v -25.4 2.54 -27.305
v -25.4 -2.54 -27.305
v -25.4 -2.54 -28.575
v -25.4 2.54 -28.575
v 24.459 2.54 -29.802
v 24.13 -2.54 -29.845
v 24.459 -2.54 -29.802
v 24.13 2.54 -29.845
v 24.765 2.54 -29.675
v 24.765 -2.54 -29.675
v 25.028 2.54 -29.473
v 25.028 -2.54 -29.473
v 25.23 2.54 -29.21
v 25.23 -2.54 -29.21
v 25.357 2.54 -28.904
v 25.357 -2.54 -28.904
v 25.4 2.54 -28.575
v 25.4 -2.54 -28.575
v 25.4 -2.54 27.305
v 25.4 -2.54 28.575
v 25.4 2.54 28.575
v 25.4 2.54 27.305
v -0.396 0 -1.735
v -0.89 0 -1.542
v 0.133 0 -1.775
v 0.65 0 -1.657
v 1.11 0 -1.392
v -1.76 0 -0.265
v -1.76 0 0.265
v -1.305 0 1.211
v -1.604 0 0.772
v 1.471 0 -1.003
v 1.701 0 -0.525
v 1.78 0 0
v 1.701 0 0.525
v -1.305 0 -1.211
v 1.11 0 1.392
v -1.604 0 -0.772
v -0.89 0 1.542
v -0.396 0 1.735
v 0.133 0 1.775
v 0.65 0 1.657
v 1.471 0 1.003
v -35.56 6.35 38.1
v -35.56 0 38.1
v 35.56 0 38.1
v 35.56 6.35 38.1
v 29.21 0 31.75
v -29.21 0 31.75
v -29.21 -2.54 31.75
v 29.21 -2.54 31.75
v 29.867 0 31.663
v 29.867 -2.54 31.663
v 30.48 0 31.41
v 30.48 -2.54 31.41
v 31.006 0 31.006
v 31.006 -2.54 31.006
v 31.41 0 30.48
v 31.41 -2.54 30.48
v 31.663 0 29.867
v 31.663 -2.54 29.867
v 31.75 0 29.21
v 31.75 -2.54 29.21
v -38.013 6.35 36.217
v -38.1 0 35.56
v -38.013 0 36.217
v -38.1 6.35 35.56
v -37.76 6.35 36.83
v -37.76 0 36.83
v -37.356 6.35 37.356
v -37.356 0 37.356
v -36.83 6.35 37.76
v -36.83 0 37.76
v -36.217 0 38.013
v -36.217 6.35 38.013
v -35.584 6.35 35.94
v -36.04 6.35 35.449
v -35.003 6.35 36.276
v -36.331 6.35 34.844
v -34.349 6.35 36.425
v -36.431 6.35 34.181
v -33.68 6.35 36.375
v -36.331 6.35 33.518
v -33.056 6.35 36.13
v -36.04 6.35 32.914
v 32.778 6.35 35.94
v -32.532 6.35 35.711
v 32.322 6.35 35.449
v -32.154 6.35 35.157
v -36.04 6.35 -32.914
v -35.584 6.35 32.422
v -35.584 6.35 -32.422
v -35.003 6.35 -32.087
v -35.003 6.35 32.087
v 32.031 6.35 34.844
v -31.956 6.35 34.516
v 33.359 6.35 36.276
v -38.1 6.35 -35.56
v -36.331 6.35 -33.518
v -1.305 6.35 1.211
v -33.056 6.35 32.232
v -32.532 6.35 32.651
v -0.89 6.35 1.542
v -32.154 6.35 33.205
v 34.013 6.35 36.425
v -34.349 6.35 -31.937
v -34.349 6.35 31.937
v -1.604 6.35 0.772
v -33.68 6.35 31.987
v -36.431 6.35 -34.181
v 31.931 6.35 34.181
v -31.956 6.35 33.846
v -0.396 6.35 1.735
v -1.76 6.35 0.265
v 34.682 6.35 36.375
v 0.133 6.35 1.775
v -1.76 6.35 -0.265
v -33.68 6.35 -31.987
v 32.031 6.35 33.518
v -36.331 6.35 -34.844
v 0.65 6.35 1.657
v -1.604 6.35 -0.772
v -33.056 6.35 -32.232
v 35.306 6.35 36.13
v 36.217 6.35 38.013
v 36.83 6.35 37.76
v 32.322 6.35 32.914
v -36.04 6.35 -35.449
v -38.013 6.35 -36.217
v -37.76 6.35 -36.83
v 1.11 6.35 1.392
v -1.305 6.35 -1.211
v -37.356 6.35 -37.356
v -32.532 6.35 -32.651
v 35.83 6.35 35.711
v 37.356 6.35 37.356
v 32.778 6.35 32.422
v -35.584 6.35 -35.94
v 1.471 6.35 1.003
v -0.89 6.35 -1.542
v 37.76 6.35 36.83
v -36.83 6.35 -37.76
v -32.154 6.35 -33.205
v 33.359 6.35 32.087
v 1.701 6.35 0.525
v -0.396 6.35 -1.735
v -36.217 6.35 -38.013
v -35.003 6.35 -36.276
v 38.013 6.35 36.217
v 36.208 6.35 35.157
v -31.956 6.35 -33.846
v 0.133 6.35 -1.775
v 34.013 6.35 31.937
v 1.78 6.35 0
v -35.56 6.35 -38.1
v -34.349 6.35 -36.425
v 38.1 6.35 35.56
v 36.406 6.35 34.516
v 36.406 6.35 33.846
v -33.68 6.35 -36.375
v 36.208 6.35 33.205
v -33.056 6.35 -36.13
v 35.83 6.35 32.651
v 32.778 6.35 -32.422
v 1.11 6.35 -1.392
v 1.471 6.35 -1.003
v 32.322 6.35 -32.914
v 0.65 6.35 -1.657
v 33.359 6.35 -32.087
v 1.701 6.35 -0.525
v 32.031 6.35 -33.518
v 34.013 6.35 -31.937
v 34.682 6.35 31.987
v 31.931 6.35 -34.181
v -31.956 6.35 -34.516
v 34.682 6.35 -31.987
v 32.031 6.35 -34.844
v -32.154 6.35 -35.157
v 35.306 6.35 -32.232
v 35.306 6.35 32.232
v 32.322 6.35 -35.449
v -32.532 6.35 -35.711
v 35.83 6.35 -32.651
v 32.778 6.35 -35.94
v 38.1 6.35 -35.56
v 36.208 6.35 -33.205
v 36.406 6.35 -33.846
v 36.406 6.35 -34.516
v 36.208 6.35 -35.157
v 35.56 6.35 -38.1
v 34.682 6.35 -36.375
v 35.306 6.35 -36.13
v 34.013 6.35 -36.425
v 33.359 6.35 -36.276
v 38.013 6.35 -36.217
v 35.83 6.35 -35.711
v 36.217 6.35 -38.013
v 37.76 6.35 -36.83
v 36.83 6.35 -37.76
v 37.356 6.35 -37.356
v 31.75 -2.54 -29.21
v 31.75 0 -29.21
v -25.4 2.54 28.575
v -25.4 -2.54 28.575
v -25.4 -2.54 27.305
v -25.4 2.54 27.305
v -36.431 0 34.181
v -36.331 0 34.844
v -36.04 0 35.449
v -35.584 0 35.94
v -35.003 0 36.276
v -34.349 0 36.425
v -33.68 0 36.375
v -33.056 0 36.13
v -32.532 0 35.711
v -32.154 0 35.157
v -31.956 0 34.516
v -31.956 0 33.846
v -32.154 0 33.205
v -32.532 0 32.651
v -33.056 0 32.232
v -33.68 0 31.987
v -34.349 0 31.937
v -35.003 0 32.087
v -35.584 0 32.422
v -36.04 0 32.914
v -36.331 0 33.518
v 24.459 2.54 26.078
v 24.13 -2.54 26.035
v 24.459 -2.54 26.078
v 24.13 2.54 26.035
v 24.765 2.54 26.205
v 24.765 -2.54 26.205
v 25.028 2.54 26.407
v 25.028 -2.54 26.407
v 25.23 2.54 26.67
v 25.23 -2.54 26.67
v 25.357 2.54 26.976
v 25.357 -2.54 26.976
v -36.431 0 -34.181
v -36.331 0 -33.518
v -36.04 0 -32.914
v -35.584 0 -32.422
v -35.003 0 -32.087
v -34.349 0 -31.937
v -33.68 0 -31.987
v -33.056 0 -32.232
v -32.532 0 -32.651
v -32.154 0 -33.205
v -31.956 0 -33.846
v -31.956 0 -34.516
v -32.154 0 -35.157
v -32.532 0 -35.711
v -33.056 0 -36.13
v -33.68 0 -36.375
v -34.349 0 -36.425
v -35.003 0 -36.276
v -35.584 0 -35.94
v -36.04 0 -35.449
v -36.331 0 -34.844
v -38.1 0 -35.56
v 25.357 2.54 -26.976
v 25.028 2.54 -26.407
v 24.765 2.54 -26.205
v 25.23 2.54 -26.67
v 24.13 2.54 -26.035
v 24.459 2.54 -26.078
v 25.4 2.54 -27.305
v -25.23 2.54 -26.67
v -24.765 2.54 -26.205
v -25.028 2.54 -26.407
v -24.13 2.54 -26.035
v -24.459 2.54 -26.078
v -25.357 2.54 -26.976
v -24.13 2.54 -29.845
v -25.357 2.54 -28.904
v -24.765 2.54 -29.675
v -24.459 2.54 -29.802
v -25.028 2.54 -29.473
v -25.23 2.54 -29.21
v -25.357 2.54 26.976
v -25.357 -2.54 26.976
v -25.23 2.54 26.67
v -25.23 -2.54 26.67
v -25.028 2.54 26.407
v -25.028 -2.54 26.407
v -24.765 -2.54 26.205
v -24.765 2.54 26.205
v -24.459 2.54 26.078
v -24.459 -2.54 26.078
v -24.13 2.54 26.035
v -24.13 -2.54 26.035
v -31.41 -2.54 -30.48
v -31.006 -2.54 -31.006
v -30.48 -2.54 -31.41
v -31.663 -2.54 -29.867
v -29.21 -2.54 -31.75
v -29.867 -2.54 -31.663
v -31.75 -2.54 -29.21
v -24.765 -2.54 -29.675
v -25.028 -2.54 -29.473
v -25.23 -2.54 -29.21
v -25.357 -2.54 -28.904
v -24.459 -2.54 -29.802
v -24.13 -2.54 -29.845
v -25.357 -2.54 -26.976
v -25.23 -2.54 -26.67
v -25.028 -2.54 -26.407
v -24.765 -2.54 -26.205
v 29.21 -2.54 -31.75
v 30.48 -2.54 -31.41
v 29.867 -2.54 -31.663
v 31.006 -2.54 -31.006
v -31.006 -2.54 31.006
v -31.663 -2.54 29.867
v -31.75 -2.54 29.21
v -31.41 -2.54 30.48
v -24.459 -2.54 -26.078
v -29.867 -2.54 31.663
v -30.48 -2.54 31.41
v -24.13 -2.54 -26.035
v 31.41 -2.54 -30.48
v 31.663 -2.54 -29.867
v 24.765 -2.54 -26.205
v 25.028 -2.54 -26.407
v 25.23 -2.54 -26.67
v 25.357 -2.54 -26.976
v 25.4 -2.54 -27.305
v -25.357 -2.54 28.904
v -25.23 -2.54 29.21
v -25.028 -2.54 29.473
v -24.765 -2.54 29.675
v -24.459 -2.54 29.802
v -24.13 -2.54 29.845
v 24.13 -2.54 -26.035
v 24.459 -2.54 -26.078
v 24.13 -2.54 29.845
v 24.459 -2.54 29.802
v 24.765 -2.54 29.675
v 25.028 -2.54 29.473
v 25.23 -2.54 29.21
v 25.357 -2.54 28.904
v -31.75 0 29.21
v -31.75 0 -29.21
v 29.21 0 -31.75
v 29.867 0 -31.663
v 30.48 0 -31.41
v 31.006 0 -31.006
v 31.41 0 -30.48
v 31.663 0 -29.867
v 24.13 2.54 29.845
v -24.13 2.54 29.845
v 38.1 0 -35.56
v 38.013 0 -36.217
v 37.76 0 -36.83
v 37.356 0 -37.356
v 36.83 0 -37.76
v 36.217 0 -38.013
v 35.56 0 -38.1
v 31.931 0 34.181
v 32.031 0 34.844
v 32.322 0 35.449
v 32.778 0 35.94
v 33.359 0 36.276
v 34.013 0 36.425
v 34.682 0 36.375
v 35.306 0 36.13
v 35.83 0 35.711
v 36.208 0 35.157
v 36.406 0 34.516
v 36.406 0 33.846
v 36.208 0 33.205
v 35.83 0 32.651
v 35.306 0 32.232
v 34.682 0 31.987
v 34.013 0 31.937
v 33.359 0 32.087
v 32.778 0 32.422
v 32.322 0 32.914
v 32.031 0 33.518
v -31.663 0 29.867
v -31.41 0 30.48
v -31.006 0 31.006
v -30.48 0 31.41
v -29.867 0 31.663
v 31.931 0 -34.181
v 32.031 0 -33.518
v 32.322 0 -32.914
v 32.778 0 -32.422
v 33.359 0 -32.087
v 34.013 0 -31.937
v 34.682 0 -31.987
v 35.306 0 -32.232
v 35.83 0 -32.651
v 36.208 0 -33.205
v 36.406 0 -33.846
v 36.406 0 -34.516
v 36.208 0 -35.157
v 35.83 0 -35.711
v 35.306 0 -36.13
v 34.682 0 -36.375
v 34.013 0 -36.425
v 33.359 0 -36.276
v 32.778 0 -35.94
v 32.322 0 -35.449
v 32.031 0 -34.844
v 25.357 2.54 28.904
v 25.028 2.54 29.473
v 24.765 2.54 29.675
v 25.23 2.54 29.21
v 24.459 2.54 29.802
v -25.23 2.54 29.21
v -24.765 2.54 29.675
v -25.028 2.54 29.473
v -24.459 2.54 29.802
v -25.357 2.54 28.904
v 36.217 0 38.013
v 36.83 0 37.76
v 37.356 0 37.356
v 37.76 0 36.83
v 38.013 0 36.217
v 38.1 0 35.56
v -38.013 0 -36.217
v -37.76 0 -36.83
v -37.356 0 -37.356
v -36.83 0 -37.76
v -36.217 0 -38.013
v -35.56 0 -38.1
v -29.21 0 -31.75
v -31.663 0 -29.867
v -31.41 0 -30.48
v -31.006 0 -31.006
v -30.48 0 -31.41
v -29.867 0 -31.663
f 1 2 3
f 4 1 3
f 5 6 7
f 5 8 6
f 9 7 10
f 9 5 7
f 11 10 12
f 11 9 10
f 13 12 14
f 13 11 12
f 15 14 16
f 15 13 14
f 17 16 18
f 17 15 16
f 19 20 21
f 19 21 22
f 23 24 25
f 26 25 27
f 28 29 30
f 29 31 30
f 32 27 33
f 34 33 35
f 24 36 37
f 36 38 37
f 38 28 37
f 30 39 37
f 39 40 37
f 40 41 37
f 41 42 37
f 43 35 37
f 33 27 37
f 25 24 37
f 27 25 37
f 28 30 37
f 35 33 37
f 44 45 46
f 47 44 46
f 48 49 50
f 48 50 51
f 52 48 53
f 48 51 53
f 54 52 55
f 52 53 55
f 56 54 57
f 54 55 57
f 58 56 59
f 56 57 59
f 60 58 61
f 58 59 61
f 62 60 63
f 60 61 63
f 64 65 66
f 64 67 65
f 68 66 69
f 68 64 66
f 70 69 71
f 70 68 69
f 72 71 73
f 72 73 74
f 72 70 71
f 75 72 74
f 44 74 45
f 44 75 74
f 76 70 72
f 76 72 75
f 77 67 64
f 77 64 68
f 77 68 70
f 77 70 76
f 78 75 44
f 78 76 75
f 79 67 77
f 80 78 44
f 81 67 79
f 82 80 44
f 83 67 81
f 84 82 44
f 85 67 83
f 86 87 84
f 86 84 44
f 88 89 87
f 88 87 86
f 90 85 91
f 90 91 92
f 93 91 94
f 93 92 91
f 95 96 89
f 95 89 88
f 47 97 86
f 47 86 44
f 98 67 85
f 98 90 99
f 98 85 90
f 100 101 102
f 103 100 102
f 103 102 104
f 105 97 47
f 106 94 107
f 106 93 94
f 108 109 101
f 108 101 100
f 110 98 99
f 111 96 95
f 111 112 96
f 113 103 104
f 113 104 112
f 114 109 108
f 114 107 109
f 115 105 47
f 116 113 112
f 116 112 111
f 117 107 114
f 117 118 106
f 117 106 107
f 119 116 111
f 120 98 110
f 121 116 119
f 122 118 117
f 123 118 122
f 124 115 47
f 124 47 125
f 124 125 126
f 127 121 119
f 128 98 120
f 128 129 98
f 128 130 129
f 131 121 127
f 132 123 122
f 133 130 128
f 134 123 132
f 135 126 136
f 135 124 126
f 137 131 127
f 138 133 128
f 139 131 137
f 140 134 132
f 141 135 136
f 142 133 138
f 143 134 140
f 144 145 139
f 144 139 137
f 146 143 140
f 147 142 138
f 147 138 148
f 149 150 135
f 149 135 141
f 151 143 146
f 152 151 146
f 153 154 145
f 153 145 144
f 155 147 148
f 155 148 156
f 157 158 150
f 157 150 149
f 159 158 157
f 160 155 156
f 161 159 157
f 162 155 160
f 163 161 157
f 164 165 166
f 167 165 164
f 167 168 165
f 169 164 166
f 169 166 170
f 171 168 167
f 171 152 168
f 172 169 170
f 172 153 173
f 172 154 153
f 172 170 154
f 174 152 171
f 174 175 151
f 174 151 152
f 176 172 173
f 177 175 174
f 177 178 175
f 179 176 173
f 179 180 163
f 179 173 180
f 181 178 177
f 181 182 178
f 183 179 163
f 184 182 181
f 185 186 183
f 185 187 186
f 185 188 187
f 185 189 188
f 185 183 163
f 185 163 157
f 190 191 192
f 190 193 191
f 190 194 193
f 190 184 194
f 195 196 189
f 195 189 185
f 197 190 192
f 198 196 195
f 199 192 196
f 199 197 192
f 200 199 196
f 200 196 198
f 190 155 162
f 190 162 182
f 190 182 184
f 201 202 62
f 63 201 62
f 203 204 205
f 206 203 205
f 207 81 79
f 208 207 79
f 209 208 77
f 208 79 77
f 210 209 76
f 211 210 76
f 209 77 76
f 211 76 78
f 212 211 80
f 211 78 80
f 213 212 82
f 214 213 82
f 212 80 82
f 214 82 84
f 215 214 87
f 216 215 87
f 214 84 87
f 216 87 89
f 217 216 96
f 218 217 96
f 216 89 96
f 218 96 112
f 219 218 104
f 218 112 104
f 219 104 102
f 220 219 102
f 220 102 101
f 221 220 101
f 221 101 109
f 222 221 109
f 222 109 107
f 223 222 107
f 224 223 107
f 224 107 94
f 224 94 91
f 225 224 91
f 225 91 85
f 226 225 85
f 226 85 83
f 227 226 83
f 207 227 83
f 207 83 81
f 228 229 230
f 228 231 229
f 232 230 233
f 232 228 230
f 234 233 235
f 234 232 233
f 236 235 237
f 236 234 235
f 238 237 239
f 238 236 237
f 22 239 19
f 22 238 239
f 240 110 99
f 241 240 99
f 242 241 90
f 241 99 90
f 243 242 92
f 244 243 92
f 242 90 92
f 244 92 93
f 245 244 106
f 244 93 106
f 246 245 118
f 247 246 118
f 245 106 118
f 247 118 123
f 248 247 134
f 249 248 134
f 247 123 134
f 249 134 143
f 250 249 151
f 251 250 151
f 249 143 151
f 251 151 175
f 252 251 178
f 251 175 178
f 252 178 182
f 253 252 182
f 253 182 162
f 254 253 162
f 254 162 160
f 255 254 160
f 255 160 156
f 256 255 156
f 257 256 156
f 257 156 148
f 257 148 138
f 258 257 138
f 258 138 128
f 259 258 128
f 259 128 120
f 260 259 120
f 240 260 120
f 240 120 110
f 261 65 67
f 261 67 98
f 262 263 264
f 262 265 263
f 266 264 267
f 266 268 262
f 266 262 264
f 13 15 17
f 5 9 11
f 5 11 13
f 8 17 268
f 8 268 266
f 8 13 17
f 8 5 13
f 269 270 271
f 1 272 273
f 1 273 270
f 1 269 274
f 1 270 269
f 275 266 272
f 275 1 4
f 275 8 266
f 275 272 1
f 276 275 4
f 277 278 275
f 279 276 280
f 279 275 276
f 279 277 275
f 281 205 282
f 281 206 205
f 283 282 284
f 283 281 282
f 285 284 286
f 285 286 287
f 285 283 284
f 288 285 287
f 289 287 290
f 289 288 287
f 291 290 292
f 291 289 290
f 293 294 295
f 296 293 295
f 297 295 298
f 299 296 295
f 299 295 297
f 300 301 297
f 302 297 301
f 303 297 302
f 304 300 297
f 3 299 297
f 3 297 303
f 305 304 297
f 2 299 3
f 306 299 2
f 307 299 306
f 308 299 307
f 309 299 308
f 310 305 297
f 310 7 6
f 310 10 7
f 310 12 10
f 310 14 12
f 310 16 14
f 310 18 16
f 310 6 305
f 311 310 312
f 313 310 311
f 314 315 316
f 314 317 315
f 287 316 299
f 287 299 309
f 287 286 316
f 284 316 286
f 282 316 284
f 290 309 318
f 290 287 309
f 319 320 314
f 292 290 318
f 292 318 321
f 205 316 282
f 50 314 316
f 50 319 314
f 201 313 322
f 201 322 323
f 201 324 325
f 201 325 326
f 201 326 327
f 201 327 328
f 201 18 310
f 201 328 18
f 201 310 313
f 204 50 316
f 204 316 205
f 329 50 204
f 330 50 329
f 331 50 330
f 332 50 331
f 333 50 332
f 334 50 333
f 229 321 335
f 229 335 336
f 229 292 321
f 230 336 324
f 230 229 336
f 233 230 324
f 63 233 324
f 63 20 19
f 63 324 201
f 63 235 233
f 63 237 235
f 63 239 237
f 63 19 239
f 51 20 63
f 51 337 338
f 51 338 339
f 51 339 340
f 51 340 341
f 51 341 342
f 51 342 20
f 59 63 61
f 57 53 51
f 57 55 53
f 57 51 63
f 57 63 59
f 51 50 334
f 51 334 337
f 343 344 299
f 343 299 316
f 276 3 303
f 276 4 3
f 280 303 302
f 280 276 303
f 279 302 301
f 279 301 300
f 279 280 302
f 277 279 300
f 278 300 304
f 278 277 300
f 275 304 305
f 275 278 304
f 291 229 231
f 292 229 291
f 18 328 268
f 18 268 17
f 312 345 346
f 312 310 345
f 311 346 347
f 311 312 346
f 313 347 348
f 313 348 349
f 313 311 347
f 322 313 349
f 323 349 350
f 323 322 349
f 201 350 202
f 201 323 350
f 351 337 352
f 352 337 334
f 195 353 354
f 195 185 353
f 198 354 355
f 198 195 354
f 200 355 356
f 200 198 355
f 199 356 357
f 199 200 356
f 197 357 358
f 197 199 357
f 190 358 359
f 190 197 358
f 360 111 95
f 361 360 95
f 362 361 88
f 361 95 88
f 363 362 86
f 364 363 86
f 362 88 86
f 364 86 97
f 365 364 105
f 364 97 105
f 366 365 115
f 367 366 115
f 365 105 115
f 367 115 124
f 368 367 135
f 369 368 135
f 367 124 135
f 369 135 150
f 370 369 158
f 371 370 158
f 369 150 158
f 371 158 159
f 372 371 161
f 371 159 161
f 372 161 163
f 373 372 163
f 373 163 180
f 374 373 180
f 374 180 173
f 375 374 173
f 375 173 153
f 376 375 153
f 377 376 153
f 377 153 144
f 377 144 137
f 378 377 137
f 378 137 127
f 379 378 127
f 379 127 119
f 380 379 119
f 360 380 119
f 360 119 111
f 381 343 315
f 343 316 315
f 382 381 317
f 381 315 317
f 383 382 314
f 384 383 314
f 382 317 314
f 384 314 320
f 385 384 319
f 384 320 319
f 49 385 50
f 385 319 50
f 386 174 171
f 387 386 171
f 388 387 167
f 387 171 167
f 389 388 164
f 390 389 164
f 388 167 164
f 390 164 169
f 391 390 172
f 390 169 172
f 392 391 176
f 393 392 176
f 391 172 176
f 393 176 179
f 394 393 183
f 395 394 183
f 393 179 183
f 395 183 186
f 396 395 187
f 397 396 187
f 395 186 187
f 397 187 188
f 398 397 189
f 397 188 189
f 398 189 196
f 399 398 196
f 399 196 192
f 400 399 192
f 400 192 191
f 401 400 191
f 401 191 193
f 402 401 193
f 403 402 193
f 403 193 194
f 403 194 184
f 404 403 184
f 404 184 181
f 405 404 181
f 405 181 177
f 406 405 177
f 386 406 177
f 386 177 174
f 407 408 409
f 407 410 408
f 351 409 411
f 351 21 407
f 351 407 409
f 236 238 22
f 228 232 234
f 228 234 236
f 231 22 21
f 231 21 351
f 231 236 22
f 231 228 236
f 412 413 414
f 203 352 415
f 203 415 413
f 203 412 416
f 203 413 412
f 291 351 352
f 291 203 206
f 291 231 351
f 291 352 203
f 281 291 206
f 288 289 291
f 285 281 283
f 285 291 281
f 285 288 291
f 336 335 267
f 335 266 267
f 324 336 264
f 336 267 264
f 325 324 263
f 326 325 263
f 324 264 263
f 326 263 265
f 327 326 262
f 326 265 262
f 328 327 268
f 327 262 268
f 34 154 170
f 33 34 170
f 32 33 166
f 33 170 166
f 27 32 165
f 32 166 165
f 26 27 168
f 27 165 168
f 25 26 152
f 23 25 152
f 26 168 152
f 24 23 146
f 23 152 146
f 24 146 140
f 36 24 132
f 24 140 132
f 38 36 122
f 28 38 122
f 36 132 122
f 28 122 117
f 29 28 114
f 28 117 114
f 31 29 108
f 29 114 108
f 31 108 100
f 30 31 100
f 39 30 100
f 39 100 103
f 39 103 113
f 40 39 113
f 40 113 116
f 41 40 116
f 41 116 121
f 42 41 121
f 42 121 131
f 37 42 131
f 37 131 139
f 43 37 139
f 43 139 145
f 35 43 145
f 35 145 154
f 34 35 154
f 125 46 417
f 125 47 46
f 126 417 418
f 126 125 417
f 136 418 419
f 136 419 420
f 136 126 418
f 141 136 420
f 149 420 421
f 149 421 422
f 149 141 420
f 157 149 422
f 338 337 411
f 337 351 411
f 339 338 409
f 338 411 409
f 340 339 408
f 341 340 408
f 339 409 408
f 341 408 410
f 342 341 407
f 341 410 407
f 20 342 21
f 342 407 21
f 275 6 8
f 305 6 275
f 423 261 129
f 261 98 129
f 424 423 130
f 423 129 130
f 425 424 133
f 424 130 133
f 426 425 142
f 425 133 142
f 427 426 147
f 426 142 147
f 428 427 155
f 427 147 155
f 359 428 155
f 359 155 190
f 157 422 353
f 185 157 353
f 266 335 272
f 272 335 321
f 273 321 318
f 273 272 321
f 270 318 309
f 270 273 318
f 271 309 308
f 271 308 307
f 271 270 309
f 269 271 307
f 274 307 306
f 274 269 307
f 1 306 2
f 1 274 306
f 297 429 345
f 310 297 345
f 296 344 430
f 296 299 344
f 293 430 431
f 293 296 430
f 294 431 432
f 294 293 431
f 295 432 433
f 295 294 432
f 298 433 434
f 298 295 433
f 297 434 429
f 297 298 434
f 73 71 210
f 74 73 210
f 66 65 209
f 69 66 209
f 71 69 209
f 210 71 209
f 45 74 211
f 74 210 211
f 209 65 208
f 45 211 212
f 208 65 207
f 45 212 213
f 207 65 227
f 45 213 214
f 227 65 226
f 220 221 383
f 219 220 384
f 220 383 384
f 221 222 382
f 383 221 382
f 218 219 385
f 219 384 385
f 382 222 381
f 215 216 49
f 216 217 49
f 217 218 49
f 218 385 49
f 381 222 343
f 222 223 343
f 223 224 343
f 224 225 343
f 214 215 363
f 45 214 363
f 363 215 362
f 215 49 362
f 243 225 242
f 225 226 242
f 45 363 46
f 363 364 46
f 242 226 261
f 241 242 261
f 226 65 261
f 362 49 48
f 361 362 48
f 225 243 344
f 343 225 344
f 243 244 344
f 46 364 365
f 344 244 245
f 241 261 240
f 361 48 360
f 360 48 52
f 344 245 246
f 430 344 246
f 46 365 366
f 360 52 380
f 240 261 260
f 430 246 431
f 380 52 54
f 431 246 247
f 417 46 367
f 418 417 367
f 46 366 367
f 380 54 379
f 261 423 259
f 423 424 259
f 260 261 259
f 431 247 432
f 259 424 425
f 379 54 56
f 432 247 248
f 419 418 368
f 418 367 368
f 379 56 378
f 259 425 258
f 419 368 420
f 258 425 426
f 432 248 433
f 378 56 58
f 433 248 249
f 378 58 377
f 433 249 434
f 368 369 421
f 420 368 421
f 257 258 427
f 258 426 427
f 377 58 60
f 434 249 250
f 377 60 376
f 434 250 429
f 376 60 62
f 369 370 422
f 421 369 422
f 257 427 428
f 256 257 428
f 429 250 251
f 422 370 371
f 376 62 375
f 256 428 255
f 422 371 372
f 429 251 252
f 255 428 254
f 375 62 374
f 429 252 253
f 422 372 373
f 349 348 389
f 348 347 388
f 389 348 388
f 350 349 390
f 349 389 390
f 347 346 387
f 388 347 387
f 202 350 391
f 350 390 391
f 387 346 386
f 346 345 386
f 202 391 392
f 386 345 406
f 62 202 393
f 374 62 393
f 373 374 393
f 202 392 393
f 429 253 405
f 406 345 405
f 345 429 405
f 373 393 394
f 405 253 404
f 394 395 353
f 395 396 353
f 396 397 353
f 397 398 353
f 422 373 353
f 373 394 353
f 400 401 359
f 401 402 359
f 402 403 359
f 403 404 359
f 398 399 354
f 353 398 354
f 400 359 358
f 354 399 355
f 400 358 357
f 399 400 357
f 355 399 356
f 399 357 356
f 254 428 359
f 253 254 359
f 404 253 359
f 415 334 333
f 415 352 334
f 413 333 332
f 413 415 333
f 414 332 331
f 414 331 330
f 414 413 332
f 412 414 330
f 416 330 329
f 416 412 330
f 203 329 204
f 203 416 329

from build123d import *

# Parameters (mm, degrees)
SKETCH1_W                = 76.2
SKETCH1_H                = 76.2
BOSS_EXTRUDE1_DEPTH      = 6.35
FILLET1_R                = 2.54
SKETCH3_R                = 1.78
CUT_EXTRUDE1_DEPTH       = 7.35
SKETCH4_W                = 63.5
SKETCH4_H                = 63.5
BOSS_EXTRUDE2_DEPTH      = 2.54
FILLET2_R                = 2.54
M4_CLEARANCE_HOLE2_D     = 4.5
M4_CLEARANCE_HOLE2_DEPTH = 13.97
M4_CLEARANCE_HOLE2_TIP   = 1.351936393
SKETCH7_W                = 50.8
SKETCH7_H                = 3.81
CUT_EXTRUDE2_DEPTH       = 5.08
FILLET3_R                = 1.27


with BuildPart() as part:
    # Sketch1 → Boss-Extrude1 (new body)
    with BuildSketch(Plane(origin=(0, 0, 0), x_dir=(1, 0, 0), z_dir=(0, 1, 0))):
        Rectangle(SKETCH1_W, SKETCH1_H)
    extrude(amount=BOSS_EXTRUDE1_DEPTH)

    # Fillet1
    fillet1_edges = [part.edges().sort_by_distance(p)[0] for p in [
        (38.1, 3.175, 38.1),
        (-38.1, 3.175, 38.1),
        (-38.1, 3.175, -38.1),
        (38.1, 3.175, -38.1),
    ]]
    fillet(fillet1_edges, radius=FILLET1_R)

    # Sketch3 → Cut-Extrude1 (cut, through all)
    with BuildSketch(Plane(origin=(0, 6.35, 0), x_dir=(1, 0, 0), z_dir=(0, 1, 0))):
        Circle(SKETCH3_R)
    extrude(amount=-CUT_EXTRUDE1_DEPTH, mode=Mode.SUBTRACT)

    # Sketch4 → Boss-Extrude2 (add)
    with BuildSketch(Plane.XZ):
        Rectangle(SKETCH4_W, SKETCH4_H)
    extrude(amount=BOSS_EXTRUDE2_DEPTH)

    # Fillet2
    fillet2_edges = [part.edges().sort_by_distance(p)[0] for p in [
        (-31.75, -1.27, 31.75),
        (-31.75, -1.27, -31.75),
        (31.75, -1.27, -31.75),
        (31.75, -1.27, 31.75),
    ]]
    fillet(fillet2_edges, radius=FILLET2_R)

    # M4 Clearance Hole2
    with Locations(Plane.XZ.offset(2.54)):
        with Locations((-34.181051224, 34.181051224), (-34.181051224, -34.181051224), (34.181051224, -34.181051224), (34.181051224, 34.181051224)):
            Hole(M4_CLEARANCE_HOLE2_D / 2, depth=M4_CLEARANCE_HOLE2_DEPTH)
            with Locations((0, 0, -(M4_CLEARANCE_HOLE2_DEPTH + M4_CLEARANCE_HOLE2_TIP / 2))):  # 118° drill point
                Cone(0, M4_CLEARANCE_HOLE2_D / 2, M4_CLEARANCE_HOLE2_TIP, mode=Mode.SUBTRACT)

    # Sketch7 → Cut-Extrude2 (cut)
    with BuildSketch(Plane(origin=(0, -2.54, 0), x_dir=(-1, 0, 0), z_dir=(0, -1, 0))):
        with Locations((0, 27.94)):
            Rectangle(SKETCH7_W, SKETCH7_H)
        with Locations((0, -27.94)):
            Rectangle(SKETCH7_W, SKETCH7_H)
    extrude(amount=-CUT_EXTRUDE2_DEPTH, mode=Mode.SUBTRACT)

    # Fillet3
    fillet3_edges = [part.edges().sort_by_distance(p)[0] for p in [
        (25.4, 0, -26.035),
        (25.4, 0, -29.845),
        (-25.4, 0, -29.845),
        (-25.4, 0, -26.035),
        (25.4, 0, 29.845),
        (25.4, 0, 26.035),
        (-25.4, 0, 26.035),
        (-25.4, 0, 29.845),
    ]]
    fillet(fillet3_edges, radius=FILLET3_R)


solid = part.part
